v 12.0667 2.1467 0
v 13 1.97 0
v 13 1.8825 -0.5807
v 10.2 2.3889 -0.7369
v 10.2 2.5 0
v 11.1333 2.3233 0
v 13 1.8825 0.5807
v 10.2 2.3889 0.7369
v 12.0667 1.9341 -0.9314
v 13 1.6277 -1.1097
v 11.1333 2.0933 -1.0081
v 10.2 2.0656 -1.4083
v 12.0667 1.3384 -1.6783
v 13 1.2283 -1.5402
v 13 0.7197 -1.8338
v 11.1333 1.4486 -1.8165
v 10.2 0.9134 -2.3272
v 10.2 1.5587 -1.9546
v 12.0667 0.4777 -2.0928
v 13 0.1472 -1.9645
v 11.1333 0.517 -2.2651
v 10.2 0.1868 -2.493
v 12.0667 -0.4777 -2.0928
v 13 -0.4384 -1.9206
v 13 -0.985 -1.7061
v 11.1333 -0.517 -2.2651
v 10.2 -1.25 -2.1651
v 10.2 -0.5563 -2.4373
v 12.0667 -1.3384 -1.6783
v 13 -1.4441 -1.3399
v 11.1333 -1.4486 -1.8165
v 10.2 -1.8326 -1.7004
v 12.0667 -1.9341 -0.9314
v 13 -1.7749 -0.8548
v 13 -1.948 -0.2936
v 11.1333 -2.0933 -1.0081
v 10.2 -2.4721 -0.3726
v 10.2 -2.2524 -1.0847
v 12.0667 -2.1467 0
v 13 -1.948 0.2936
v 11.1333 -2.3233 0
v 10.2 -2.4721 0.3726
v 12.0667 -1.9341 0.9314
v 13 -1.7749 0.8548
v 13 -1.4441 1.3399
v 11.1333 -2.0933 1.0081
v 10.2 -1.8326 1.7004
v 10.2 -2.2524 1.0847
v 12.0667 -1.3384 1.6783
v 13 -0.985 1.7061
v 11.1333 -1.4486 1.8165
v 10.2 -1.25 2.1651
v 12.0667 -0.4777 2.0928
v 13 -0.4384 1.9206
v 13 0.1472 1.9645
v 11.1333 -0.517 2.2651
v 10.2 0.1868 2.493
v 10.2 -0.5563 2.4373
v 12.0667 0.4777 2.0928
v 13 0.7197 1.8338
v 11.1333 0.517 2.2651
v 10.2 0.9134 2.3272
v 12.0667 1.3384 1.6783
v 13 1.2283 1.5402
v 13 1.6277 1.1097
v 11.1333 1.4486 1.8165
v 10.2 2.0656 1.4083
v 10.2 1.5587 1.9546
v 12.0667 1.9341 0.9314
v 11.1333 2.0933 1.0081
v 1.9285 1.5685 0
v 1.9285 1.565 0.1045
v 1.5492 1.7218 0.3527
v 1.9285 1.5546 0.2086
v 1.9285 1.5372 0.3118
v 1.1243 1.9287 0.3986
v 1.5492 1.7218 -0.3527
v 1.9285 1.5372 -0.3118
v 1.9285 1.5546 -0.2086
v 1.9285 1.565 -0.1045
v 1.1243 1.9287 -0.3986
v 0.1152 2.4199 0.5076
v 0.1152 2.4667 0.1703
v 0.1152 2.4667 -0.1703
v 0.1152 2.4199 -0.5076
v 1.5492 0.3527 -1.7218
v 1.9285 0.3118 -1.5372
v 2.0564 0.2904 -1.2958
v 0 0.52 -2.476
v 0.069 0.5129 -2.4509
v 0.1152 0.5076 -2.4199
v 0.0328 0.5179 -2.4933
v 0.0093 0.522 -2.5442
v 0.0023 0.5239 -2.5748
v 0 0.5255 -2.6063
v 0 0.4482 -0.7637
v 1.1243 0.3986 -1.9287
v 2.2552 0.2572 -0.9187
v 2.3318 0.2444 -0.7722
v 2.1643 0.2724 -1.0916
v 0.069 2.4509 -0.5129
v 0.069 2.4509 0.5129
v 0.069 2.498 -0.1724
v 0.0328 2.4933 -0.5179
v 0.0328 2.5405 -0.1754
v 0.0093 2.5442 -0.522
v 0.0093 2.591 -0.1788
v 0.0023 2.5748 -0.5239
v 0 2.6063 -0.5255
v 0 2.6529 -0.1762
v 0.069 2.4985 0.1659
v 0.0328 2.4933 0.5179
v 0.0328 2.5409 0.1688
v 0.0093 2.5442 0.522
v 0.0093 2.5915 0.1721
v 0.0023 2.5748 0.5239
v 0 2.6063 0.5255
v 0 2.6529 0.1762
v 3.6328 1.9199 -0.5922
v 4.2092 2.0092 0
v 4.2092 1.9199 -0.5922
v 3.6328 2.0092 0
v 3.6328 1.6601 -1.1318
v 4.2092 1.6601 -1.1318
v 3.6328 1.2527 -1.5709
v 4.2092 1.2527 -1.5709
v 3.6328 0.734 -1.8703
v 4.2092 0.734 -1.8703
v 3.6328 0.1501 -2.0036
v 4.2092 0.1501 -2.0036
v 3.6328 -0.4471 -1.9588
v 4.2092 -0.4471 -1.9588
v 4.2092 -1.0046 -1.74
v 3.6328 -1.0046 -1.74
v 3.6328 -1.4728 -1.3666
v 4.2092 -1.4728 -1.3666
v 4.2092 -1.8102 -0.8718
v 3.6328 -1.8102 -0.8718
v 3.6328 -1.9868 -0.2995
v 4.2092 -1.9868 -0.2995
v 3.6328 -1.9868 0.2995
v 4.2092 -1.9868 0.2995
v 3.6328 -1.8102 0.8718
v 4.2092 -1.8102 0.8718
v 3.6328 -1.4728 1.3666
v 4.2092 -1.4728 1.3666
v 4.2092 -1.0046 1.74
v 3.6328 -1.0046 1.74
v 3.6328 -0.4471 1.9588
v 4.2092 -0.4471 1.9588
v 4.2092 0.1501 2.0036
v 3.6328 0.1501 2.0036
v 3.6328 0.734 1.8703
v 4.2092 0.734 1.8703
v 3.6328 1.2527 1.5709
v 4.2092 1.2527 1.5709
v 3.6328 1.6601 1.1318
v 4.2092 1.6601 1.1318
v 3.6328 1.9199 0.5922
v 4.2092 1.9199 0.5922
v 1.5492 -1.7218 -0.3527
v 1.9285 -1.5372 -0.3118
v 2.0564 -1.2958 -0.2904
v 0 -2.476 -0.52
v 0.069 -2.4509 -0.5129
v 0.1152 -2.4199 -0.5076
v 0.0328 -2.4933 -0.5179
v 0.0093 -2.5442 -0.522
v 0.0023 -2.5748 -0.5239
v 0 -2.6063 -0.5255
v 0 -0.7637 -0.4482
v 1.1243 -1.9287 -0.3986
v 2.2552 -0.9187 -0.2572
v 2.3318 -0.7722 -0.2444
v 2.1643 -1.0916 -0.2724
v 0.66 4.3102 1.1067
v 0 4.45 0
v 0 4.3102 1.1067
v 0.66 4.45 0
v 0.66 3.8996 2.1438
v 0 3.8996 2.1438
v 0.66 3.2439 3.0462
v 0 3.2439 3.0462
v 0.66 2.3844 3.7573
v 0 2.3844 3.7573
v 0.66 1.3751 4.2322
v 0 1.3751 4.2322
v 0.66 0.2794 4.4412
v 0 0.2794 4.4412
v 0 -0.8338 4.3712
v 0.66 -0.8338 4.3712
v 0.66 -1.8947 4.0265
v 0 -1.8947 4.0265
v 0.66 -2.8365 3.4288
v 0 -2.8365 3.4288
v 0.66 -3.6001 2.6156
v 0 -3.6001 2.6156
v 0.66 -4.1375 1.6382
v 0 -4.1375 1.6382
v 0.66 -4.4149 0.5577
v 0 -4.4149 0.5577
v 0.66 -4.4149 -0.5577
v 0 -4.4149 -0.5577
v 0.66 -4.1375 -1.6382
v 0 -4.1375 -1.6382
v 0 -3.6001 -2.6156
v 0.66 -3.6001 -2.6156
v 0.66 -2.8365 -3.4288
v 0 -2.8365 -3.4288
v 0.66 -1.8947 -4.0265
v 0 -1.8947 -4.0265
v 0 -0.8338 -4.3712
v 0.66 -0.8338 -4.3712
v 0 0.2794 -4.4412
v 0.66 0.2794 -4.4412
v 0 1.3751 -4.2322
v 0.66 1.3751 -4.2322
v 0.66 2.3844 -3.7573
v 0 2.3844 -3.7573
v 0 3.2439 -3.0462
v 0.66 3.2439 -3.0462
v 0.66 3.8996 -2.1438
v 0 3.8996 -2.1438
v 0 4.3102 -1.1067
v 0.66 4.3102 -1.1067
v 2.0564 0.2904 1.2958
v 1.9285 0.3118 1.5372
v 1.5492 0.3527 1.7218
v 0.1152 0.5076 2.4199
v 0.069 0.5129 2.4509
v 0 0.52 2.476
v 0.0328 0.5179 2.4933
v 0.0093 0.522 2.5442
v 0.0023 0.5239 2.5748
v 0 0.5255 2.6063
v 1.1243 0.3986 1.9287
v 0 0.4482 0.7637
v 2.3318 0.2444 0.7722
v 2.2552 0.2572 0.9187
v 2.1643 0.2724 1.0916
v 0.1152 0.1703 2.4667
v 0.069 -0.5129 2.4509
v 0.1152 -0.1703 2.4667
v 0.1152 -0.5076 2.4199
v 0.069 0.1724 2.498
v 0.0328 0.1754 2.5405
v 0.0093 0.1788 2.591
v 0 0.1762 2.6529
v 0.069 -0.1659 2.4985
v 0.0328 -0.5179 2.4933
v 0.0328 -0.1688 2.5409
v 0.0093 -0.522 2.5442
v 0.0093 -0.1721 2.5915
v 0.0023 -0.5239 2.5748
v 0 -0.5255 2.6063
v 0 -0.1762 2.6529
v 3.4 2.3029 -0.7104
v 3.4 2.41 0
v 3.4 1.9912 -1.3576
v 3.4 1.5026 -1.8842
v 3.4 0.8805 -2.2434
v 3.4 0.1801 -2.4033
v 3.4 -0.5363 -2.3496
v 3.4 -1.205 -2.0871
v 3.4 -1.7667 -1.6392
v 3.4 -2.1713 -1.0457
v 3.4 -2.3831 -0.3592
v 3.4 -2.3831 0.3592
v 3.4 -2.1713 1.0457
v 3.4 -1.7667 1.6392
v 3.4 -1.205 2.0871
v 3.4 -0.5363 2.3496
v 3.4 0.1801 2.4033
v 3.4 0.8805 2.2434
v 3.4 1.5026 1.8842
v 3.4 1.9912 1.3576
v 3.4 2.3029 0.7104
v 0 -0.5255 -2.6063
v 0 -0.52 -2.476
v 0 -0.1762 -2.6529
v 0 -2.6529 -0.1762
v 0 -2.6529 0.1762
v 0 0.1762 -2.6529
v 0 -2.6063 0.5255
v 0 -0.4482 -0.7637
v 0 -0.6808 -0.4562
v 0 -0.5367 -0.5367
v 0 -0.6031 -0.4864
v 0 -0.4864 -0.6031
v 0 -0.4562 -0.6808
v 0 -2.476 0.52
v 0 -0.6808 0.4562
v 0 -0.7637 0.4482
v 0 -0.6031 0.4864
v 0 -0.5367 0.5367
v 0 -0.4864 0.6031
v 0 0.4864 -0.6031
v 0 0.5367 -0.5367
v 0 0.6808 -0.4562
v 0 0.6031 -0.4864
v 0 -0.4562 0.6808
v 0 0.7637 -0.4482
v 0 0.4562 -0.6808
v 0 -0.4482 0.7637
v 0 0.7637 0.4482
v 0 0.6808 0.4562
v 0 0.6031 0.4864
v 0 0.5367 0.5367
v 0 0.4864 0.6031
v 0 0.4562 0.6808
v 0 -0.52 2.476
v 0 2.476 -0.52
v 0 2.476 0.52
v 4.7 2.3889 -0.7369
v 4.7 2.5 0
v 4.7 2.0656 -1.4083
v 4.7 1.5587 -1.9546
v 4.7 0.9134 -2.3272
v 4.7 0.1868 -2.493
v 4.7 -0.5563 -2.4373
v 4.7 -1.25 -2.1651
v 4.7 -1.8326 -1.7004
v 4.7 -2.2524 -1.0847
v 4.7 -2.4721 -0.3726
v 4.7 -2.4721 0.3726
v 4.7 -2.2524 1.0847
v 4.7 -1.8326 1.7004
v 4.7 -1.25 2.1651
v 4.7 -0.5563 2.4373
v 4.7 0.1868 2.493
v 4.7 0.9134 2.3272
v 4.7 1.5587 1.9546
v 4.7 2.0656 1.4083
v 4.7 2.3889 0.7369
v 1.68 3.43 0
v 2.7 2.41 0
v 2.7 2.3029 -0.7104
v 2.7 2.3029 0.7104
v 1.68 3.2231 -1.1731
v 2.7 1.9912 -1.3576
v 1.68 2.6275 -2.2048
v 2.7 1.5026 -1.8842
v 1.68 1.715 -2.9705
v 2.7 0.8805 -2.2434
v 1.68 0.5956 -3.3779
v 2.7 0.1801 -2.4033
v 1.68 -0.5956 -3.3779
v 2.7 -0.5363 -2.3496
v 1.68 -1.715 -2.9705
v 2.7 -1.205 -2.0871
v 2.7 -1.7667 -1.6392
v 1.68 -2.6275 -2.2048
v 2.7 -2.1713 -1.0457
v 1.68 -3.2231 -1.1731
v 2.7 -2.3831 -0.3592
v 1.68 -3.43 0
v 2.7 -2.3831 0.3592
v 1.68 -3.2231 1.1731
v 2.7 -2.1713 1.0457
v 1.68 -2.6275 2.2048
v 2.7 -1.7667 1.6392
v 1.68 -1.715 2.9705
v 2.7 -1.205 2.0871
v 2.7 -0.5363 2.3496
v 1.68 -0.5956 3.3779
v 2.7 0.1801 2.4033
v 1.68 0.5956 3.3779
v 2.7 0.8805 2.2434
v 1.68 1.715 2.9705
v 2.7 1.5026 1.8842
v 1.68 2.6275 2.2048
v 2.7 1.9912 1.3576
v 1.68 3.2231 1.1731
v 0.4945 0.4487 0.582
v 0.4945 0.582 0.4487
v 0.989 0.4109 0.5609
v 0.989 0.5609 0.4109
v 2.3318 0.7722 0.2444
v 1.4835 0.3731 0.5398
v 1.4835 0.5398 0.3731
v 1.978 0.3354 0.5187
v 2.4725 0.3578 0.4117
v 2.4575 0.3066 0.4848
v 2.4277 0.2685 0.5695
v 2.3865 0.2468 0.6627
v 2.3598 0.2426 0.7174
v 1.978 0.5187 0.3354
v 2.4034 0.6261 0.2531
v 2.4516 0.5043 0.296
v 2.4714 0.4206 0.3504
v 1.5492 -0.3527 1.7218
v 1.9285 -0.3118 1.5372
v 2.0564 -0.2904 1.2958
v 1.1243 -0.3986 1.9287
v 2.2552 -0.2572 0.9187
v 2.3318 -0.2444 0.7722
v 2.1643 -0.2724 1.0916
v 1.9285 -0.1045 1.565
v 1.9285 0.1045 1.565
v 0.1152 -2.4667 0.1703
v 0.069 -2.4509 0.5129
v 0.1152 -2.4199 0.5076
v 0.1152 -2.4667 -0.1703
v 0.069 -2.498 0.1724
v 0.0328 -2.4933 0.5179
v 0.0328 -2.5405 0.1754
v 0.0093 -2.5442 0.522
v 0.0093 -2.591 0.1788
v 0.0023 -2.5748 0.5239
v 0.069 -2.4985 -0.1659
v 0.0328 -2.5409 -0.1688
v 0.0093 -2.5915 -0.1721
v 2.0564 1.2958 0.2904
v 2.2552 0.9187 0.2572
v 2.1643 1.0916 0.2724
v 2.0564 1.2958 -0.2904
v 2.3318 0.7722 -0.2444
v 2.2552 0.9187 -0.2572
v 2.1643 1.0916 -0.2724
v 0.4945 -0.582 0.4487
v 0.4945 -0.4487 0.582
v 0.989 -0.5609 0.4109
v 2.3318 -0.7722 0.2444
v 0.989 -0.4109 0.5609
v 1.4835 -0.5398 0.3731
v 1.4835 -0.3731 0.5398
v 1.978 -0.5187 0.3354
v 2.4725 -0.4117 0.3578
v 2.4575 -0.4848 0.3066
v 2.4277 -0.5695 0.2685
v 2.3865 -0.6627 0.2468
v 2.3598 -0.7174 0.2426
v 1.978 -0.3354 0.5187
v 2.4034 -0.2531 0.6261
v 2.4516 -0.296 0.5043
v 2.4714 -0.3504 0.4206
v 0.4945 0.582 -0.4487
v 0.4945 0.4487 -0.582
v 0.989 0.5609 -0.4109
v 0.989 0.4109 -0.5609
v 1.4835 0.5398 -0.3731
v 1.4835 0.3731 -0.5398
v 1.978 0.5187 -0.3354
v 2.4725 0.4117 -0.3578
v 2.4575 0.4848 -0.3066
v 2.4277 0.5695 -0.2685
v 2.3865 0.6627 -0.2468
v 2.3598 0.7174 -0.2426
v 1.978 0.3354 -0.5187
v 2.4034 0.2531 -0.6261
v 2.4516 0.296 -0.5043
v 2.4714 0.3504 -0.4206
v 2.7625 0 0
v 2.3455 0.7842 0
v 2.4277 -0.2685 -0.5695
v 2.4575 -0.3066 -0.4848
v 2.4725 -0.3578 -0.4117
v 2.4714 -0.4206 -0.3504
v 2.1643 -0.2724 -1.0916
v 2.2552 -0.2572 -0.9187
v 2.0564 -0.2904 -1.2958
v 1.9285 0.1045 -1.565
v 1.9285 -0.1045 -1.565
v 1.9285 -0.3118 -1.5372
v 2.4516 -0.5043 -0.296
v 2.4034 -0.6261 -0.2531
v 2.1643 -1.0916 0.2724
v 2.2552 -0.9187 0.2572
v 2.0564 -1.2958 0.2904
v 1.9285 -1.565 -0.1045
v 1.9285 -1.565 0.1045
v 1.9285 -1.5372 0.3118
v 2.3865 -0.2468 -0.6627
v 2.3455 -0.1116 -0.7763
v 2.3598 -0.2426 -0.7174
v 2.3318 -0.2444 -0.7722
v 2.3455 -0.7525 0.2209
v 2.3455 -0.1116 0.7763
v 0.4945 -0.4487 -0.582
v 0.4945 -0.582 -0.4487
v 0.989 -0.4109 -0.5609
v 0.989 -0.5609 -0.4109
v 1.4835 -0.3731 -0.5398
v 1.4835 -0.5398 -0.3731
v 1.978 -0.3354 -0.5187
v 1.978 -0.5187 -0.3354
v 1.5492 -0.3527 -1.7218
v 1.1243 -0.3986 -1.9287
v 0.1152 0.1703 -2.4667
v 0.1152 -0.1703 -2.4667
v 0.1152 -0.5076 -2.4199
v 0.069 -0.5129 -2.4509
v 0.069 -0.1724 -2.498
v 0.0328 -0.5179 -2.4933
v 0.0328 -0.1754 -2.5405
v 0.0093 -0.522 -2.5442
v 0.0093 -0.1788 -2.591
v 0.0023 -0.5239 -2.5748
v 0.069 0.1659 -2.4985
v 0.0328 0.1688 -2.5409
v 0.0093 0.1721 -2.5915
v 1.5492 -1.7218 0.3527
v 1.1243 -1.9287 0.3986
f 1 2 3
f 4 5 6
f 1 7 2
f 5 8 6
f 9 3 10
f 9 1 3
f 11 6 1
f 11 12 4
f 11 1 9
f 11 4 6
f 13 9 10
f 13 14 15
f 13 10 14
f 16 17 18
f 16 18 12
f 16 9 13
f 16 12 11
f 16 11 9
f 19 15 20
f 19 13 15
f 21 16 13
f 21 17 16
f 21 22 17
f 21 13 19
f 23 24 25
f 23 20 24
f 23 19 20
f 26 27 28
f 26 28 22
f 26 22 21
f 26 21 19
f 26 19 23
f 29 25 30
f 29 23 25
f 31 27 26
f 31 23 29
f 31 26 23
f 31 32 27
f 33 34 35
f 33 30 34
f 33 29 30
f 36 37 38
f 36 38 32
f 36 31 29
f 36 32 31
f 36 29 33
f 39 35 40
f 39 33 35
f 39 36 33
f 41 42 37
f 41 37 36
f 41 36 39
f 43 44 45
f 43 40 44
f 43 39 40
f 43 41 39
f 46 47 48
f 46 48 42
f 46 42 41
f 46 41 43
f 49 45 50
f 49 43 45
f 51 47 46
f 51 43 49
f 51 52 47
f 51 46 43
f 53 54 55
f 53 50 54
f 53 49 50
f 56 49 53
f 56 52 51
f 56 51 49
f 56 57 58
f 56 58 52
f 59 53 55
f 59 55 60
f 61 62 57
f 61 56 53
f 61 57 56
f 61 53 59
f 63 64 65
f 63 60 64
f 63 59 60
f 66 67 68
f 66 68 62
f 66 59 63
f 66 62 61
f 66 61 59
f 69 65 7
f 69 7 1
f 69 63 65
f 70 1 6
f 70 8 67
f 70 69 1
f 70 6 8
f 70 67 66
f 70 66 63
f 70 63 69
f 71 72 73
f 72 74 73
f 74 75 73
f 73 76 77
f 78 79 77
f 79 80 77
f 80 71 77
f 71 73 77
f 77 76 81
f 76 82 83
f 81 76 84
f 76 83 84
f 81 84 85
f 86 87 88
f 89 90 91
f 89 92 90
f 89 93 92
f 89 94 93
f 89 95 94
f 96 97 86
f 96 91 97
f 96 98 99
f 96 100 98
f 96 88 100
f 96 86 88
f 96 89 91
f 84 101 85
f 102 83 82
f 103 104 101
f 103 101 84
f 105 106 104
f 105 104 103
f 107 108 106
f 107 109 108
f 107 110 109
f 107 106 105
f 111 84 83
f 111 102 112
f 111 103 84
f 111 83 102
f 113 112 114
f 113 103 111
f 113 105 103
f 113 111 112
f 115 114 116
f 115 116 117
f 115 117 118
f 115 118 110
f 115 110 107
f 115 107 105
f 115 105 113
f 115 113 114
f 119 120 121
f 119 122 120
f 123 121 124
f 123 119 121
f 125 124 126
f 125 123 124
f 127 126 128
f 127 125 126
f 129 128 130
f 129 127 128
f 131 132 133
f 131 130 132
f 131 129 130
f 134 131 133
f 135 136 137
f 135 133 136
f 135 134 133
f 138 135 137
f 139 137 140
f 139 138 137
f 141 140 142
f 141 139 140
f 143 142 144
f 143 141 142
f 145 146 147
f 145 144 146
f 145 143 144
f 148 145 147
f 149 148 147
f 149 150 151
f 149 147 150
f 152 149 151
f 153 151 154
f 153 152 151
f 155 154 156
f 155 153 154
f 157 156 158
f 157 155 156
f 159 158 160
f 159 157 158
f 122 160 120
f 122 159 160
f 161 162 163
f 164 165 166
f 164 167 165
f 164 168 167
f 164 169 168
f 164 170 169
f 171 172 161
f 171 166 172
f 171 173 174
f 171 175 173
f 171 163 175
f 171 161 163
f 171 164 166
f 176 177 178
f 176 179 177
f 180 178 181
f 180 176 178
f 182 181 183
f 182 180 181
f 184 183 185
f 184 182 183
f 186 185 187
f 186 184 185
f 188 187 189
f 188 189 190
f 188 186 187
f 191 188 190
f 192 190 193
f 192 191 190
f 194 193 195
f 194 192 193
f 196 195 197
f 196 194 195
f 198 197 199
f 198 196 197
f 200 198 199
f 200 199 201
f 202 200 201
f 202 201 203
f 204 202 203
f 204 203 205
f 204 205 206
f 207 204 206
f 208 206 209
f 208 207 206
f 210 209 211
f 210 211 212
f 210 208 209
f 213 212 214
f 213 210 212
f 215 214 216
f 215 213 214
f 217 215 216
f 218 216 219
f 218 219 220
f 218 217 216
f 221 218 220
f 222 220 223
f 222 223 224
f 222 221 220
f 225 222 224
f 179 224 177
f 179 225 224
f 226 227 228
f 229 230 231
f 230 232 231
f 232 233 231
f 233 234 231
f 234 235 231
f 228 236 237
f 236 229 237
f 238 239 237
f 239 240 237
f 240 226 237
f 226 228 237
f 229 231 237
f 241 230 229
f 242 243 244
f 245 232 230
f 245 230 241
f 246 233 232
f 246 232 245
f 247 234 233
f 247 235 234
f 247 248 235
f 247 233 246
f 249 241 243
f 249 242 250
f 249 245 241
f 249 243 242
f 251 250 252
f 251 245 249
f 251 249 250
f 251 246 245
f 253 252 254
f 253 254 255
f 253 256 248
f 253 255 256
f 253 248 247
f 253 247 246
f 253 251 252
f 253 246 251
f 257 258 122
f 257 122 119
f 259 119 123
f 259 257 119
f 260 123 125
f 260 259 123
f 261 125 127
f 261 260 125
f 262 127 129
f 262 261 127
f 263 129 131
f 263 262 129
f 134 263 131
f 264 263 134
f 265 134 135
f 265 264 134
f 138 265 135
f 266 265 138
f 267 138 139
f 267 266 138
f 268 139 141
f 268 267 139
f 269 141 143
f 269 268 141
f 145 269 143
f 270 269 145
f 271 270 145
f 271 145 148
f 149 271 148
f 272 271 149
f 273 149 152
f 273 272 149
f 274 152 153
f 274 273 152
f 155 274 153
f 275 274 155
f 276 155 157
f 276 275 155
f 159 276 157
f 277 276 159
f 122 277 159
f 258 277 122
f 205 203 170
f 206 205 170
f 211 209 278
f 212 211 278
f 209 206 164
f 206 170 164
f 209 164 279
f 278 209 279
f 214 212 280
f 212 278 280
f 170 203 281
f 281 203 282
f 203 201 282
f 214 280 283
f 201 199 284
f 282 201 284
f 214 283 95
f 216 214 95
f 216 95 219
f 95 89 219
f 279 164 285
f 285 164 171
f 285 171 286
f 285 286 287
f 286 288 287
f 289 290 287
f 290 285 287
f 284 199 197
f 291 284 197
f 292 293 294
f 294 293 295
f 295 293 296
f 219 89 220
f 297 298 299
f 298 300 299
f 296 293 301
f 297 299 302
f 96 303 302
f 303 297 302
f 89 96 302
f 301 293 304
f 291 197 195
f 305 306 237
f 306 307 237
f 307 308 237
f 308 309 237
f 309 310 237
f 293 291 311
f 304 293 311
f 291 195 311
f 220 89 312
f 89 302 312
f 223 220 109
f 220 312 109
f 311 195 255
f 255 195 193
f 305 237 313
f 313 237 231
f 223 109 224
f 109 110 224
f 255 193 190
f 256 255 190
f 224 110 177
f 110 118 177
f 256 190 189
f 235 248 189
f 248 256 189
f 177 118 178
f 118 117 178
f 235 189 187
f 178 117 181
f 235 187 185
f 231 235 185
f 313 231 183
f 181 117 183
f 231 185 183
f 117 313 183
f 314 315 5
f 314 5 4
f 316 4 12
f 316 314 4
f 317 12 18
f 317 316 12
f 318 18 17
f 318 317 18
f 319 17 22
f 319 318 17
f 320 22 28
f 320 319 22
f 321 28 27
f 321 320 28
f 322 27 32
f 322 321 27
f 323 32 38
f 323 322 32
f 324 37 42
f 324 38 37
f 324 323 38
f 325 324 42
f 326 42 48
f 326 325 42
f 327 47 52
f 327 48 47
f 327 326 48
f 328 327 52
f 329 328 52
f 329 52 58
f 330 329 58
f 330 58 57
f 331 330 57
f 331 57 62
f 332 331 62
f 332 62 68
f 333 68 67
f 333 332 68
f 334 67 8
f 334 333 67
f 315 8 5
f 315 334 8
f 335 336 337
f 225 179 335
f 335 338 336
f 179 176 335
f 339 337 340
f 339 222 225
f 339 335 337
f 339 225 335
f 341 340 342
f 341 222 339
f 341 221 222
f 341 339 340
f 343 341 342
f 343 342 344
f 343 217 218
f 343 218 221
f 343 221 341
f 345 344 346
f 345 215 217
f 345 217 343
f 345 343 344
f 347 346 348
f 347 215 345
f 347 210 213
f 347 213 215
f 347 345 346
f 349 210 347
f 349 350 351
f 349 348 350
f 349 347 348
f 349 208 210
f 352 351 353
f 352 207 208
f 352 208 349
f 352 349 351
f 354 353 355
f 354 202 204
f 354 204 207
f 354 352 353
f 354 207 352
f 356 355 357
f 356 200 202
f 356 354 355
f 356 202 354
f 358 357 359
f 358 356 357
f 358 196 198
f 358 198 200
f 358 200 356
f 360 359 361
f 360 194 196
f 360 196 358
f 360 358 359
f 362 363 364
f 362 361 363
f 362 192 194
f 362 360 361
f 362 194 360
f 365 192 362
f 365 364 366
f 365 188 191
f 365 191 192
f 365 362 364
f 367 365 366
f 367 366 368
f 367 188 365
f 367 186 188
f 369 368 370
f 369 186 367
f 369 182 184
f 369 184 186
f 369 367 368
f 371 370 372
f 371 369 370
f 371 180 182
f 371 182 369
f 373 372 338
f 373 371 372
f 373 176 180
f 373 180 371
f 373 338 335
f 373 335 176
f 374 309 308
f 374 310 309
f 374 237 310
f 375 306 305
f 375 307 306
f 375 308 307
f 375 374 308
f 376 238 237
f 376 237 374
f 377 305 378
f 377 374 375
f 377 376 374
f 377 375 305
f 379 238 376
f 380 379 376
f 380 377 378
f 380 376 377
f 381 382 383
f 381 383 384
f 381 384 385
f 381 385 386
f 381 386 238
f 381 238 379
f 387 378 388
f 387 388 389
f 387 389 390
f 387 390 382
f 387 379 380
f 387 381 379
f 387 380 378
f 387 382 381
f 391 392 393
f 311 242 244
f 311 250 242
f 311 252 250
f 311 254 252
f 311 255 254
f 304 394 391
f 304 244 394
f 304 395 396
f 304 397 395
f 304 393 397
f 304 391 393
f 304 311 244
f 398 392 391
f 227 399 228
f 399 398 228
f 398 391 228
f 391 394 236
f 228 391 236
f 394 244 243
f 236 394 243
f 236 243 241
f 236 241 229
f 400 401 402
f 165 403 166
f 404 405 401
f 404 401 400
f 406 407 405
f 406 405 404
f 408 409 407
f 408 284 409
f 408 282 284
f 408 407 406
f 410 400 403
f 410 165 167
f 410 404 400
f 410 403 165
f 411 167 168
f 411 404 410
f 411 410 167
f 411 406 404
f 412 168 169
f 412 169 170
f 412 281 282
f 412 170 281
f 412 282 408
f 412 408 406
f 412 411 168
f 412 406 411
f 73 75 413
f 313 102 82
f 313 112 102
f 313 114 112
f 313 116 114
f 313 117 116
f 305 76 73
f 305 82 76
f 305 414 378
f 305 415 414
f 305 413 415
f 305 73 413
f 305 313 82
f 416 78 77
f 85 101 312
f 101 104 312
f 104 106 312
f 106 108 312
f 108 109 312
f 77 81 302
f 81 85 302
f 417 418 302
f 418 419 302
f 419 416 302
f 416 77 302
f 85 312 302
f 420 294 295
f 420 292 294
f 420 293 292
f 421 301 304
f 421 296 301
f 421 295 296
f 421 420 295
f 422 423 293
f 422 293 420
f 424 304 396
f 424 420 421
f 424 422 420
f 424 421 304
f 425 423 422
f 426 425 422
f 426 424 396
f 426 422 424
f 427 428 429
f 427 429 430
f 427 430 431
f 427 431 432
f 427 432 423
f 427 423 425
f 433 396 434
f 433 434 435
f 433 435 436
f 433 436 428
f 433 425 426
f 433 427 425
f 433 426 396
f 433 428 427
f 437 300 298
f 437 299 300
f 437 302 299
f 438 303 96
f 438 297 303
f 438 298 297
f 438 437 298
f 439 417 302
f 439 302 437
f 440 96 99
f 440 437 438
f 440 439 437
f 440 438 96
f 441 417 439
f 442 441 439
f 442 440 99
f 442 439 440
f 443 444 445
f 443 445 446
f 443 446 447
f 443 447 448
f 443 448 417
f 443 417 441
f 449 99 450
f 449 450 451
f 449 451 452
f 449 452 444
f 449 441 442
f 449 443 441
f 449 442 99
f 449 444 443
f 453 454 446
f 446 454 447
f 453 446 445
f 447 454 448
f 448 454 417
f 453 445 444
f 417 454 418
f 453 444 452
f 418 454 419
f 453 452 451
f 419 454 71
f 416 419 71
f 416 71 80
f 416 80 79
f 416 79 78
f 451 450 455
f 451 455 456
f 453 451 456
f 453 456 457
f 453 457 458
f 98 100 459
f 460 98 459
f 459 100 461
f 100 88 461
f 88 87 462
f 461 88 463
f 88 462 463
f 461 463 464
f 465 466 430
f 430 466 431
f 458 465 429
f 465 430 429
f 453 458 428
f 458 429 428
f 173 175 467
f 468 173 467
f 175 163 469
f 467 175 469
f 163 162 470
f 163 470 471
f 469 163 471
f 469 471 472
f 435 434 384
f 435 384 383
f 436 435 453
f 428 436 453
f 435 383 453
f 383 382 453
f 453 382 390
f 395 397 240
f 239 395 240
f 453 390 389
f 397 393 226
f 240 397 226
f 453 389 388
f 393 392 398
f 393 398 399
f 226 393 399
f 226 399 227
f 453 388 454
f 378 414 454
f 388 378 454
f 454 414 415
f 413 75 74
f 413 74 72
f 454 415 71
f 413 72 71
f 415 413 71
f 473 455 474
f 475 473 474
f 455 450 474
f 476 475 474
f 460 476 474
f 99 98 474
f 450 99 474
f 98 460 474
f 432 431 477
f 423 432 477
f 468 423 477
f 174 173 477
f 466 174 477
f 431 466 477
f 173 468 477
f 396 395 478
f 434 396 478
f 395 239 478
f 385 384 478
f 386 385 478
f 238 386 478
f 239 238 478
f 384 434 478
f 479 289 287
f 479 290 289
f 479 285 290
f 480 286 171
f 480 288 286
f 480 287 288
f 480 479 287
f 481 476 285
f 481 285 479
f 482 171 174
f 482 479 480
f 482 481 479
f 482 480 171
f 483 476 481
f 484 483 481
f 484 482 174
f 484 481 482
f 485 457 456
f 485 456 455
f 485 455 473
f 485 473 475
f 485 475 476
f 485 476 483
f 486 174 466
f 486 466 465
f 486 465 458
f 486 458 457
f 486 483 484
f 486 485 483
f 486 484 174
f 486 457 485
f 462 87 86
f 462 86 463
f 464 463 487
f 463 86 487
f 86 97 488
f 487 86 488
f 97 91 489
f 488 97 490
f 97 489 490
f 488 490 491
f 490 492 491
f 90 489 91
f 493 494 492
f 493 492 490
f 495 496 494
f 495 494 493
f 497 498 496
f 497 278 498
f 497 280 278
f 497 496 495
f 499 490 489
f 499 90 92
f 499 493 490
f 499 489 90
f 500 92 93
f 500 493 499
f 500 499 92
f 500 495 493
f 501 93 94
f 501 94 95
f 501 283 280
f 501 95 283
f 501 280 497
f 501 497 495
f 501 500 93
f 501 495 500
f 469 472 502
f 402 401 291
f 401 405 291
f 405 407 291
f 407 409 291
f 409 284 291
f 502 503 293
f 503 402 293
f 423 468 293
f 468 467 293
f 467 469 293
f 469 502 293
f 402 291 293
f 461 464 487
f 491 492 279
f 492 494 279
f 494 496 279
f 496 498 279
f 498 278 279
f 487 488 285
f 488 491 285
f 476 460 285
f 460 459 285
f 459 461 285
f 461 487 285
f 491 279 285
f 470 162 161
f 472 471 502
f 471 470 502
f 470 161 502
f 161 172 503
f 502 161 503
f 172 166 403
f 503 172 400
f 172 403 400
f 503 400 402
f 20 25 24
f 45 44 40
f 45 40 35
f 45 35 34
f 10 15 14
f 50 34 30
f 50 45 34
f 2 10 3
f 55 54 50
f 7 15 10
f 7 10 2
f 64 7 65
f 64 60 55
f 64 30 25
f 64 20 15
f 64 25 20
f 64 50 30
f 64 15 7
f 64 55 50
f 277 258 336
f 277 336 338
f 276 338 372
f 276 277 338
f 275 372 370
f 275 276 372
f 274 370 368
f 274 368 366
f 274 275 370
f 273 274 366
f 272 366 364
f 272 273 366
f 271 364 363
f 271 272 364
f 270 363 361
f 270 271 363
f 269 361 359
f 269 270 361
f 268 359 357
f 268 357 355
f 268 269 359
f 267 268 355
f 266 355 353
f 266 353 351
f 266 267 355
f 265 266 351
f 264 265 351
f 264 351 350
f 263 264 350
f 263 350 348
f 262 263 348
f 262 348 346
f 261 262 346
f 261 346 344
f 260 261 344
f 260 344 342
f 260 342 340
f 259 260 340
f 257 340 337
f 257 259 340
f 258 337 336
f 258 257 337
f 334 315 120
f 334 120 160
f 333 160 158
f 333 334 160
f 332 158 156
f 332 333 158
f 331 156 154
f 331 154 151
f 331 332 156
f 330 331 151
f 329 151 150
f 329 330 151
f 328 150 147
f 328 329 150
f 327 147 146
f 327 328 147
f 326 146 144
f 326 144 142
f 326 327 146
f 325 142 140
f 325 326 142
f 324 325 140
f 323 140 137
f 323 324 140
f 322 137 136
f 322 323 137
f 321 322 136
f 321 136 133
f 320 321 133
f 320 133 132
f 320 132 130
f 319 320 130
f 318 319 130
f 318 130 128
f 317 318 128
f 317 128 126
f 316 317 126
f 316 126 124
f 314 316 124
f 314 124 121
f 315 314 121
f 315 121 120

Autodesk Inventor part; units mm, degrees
ref_plane "YZ Plane" through (0, 0, 0) normal (1, 0, 0) x (0, 1, 0)
ref_plane "XZ Plane" through (0, 0, 0) normal (0, 1, 0) x (-1, 0, 0)
sketch "Sketch1" plane through (0, 0, 0) normal (0, 0, 1) x (1, 0, 0)
  line L0 (2.7625, 0) -> (13, 0)
  line L1 (13, 0) -> (13, 2.5)
  line L2 (13, 2.5) -> (4.7, 2.5)
  line L3 (4.7, 2.5) -> (4.2092, 2.0092)
  line L4 (4.2092, 2.0092) -> (3.6328, 2.0092)
  line L5 (0, 4.45) -> (0, 2.53)
  line L6 (0, 2.53) -> (1.9285, 1.5685)
  line L7 (1.9285, 1.5685) -> (2.7625, 0)
  line L8 (-2.6, 0) -> (15.6, 0) projected
  line L9 (0, -0.89) -> (0, 5.34) projected
  line L10 (0, 4.45) -> (0.66, 4.45)
  line L11 (0.66, 4.45) -> (2.7, 2.41)
  line L12 (2.7, 2.41) -> (3.4, 2.41)
  line L13 (3.4, 2.41) -> (3.6328, 2.0092)
  line L14 (3.4, 2.41) -> (4.61, 2.41) construction
  line L15 (4.7, 2.5) -> (2.61, 2.5) construction
  dimension "d0" = 8.3
  dimension "d1" = 5
  dimension "d2" = 4.0185
  dimension "d3" = 5.06
  dimension "d4" = 26.5
  dimension "d5" = 62
  dimension "d6" = 2.7625
  dimension "d11" = 8.9
  dimension "d12" = 4.82
  dimension "d13" = 45
  dimension "d14" = 59.85
  dimension "d15" = 2.7
  dimension "d17" = 0.7
  dimension "d19" = 13
  dimension "d27" = 45
revolve "Body" add sketch "Sketch1" angle 360 about axis through (2.7625, 0, 0) along (1, 0, 0) contours L7 L6 L5 L10 L11 L12 L13 L4 L3 L2 L1 L0
sketch "Sketch2" plane through (0, 0, 0) normal (-1, 0, 0) x (0, 0, 1)
  line L0 (0, 2.53) -> (0, 0) construction
  line L1 (0, 0) -> (2.53, 0) construction
  arc A0 (0.759, 0) -> (0, 0.759) centre (0, 0) ccw construction
  arc A1 (0.8855, 0) -> (0, 0.8855) centre (0, 0) ccw construction
  arc A2 (2.476, 0.52) -> (0.52, 2.476) centre (0, 0) ccw
  line L2 (0, 0) -> (1.789, 1.789) construction
  line L3 (0.52, 2.476) -> (0.4482, 0.7637)
  line L4 (2.476, 0.52) -> (0.7637, 0.4482)
  arc A3 (0.52, 2.476) -> (0, 2.53) centre (0, 0) ccw
  arc A4 (2.53, 0) -> (2.476, 0.52) centre (0, 0) ccw
  line L5 (0, -6.23) -> (0, 6.23) projected
  line L6 (-6.23, 0) -> (6.23, 0) projected
  arc A5 (0.52, -2.476) -> (2.476, -0.52) centre (0, 0) ccw
  line L7 (0.52, -2.476) -> (0.4482, -0.7637)
  line L8 (2.476, -0.52) -> (0.7637, -0.4482)
  arc A6 (0, -2.53) -> (0.52, -2.476) centre (0, 0) ccw
  arc A7 (2.476, -0.52) -> (2.53, 0) centre (0, 0) ccw
  arc A8 (-0.52, 2.476) -> (-2.476, 0.52) centre (0, 0) ccw
  line L9 (-0.52, 2.476) -> (-0.4482, 0.7637)
  line L10 (-2.476, 0.52) -> (-0.7637, 0.4482)
  arc A9 (0, 2.53) -> (-0.52, 2.476) centre (0, 0) ccw
  arc A10 (-2.476, 0.52) -> (-2.53, 0) centre (0, 0) ccw
  arc A11 (-0.52, -2.476) -> (0, -2.53) centre (0, 0) ccw
  arc A12 (-2.476, -0.52) -> (-0.52, -2.476) centre (0, 0) ccw
  arc A13 (-2.53, 0) -> (-2.476, -0.52) centre (0, 0) ccw
  line L11 (-2.476, -0.52) -> (-0.7637, -0.4482)
  line L12 (-0.52, -2.476) -> (-0.4482, -0.7637)
  arc A14 (0.4482, 0.7637) -> (0.7637, 0.4482) centre (0.751, 0.751) ccw
  arc A15 (0.7637, -0.4482) -> (0.4482, -0.7637) centre (0.751, -0.751) ccw
  arc A16 (-0.7637, 0.4482) -> (-0.4482, 0.7637) centre (-0.751, 0.751) ccw
  arc A17 (-0.4482, -0.7637) -> (-0.7637, -0.4482) centre (-0.751, -0.751) ccw
  point P0 (1.789, -1.789)
  point P1 (-1.789, 1.789)
  point P2 (-1.789, -1.789)
  dimension "d20" = 1.518
  dimension "d21" = 1.771
  dimension "d22" = 5.06
  dimension "d23" = 45
  dimension "d24" = 0.52
extrude "Slot" add sketch "Sketch2" against normal up to next draft 5 contours L4 A14 L3 A2 | A5 L7 A15 L8 | L9 A16 L10 A8 | A12 L11 A17 L12
fillet "Fillet1" radius 0.208 4 edges at (0, 2.53, 0) (0, 0, -2.53) (0, -2.53, 0) (0, 0, 2.53)
thread "Thread" size "M5x0.8" class "6g" standard "ISO Metric profile" length 8.3
chamfer "Chamfer1" distance 0.53 distance2 2.8 1 edges at (13, -2.5, 0) measured on face at (13, -0.5525, -0.0341)
ref_plane "Work Plane2" through (3.3, 0, 0) normal (0, 0, 1) x (1, 0, 0)
equation "\"d20\" = 0.3 * SDM"
equation "\"d21\" = 0.35 * SDM"
equation "\"d22\" = SDM"
equation "\"d24\" = 0.5 * SBR"
equation "\"d0\" = GEL"
equation "\"d1\" = NND"
equation "\"d2\" = GD1"
equation "\"d3\" = SDM"
equation "\"d6\" = 0.85 * INTI"
equation "\"d11\" = KOD"
equation "\"d12\" = SD2"
equation "\"d13\" = 0.5 * SEWI"
equation "\"d14\" = 1.33 * ANGL"
equation "\"d15\" = KOH"
equation "\"d17\" = SD"
equation "\"d19\" = NLG"
equation "\"d27\" = ANGL"
equation "\"d26\" = 0.2 * SBR"
equation "\"d8\" = GEL"
equation "\"d28\" = -0.5 * GD2 + 0.5 * NND"
equation "\"d29\" = SPTZ"
equation "\"NLG\" = 13"
equation "\"GEL\" = 8.3"
equation "\"GD2\" = 3.94"
equation "\"KOD\" = 8.9"
equation "\"KOH\" = 2.7"
equation "\"SBR\" = 1.04"
equation "\"INTI\" = 3.25"
equation "\"SDM\" = 5.06"
equation "\"NND\" = 5"
equation "\"GD1\" = THREADDIA - 1.2269 * PTC"
equation "\"SEWI\" = 90deg"
equation "\"d7\" = SDM"
equation "\"ANGL\" = 45deg"
equation "\"SD\" = 0.7"
equation "\"SD2\" = 4.82"
equation "\"SPTZ\" = 2.8"
equation "\"TOA\" = 30deg"
equation "\"THREADDIA\" = 5"
equation "\"PTC\" = 0.8"
equation "\"GUL\" = 0.61345 * PTC"
equation "\"GAL\" = 0.61345 * PTC"
properties part number "ANSI B18.6.5M - M5x0.8 x 13 - D - I" material "Steel, Mild"
